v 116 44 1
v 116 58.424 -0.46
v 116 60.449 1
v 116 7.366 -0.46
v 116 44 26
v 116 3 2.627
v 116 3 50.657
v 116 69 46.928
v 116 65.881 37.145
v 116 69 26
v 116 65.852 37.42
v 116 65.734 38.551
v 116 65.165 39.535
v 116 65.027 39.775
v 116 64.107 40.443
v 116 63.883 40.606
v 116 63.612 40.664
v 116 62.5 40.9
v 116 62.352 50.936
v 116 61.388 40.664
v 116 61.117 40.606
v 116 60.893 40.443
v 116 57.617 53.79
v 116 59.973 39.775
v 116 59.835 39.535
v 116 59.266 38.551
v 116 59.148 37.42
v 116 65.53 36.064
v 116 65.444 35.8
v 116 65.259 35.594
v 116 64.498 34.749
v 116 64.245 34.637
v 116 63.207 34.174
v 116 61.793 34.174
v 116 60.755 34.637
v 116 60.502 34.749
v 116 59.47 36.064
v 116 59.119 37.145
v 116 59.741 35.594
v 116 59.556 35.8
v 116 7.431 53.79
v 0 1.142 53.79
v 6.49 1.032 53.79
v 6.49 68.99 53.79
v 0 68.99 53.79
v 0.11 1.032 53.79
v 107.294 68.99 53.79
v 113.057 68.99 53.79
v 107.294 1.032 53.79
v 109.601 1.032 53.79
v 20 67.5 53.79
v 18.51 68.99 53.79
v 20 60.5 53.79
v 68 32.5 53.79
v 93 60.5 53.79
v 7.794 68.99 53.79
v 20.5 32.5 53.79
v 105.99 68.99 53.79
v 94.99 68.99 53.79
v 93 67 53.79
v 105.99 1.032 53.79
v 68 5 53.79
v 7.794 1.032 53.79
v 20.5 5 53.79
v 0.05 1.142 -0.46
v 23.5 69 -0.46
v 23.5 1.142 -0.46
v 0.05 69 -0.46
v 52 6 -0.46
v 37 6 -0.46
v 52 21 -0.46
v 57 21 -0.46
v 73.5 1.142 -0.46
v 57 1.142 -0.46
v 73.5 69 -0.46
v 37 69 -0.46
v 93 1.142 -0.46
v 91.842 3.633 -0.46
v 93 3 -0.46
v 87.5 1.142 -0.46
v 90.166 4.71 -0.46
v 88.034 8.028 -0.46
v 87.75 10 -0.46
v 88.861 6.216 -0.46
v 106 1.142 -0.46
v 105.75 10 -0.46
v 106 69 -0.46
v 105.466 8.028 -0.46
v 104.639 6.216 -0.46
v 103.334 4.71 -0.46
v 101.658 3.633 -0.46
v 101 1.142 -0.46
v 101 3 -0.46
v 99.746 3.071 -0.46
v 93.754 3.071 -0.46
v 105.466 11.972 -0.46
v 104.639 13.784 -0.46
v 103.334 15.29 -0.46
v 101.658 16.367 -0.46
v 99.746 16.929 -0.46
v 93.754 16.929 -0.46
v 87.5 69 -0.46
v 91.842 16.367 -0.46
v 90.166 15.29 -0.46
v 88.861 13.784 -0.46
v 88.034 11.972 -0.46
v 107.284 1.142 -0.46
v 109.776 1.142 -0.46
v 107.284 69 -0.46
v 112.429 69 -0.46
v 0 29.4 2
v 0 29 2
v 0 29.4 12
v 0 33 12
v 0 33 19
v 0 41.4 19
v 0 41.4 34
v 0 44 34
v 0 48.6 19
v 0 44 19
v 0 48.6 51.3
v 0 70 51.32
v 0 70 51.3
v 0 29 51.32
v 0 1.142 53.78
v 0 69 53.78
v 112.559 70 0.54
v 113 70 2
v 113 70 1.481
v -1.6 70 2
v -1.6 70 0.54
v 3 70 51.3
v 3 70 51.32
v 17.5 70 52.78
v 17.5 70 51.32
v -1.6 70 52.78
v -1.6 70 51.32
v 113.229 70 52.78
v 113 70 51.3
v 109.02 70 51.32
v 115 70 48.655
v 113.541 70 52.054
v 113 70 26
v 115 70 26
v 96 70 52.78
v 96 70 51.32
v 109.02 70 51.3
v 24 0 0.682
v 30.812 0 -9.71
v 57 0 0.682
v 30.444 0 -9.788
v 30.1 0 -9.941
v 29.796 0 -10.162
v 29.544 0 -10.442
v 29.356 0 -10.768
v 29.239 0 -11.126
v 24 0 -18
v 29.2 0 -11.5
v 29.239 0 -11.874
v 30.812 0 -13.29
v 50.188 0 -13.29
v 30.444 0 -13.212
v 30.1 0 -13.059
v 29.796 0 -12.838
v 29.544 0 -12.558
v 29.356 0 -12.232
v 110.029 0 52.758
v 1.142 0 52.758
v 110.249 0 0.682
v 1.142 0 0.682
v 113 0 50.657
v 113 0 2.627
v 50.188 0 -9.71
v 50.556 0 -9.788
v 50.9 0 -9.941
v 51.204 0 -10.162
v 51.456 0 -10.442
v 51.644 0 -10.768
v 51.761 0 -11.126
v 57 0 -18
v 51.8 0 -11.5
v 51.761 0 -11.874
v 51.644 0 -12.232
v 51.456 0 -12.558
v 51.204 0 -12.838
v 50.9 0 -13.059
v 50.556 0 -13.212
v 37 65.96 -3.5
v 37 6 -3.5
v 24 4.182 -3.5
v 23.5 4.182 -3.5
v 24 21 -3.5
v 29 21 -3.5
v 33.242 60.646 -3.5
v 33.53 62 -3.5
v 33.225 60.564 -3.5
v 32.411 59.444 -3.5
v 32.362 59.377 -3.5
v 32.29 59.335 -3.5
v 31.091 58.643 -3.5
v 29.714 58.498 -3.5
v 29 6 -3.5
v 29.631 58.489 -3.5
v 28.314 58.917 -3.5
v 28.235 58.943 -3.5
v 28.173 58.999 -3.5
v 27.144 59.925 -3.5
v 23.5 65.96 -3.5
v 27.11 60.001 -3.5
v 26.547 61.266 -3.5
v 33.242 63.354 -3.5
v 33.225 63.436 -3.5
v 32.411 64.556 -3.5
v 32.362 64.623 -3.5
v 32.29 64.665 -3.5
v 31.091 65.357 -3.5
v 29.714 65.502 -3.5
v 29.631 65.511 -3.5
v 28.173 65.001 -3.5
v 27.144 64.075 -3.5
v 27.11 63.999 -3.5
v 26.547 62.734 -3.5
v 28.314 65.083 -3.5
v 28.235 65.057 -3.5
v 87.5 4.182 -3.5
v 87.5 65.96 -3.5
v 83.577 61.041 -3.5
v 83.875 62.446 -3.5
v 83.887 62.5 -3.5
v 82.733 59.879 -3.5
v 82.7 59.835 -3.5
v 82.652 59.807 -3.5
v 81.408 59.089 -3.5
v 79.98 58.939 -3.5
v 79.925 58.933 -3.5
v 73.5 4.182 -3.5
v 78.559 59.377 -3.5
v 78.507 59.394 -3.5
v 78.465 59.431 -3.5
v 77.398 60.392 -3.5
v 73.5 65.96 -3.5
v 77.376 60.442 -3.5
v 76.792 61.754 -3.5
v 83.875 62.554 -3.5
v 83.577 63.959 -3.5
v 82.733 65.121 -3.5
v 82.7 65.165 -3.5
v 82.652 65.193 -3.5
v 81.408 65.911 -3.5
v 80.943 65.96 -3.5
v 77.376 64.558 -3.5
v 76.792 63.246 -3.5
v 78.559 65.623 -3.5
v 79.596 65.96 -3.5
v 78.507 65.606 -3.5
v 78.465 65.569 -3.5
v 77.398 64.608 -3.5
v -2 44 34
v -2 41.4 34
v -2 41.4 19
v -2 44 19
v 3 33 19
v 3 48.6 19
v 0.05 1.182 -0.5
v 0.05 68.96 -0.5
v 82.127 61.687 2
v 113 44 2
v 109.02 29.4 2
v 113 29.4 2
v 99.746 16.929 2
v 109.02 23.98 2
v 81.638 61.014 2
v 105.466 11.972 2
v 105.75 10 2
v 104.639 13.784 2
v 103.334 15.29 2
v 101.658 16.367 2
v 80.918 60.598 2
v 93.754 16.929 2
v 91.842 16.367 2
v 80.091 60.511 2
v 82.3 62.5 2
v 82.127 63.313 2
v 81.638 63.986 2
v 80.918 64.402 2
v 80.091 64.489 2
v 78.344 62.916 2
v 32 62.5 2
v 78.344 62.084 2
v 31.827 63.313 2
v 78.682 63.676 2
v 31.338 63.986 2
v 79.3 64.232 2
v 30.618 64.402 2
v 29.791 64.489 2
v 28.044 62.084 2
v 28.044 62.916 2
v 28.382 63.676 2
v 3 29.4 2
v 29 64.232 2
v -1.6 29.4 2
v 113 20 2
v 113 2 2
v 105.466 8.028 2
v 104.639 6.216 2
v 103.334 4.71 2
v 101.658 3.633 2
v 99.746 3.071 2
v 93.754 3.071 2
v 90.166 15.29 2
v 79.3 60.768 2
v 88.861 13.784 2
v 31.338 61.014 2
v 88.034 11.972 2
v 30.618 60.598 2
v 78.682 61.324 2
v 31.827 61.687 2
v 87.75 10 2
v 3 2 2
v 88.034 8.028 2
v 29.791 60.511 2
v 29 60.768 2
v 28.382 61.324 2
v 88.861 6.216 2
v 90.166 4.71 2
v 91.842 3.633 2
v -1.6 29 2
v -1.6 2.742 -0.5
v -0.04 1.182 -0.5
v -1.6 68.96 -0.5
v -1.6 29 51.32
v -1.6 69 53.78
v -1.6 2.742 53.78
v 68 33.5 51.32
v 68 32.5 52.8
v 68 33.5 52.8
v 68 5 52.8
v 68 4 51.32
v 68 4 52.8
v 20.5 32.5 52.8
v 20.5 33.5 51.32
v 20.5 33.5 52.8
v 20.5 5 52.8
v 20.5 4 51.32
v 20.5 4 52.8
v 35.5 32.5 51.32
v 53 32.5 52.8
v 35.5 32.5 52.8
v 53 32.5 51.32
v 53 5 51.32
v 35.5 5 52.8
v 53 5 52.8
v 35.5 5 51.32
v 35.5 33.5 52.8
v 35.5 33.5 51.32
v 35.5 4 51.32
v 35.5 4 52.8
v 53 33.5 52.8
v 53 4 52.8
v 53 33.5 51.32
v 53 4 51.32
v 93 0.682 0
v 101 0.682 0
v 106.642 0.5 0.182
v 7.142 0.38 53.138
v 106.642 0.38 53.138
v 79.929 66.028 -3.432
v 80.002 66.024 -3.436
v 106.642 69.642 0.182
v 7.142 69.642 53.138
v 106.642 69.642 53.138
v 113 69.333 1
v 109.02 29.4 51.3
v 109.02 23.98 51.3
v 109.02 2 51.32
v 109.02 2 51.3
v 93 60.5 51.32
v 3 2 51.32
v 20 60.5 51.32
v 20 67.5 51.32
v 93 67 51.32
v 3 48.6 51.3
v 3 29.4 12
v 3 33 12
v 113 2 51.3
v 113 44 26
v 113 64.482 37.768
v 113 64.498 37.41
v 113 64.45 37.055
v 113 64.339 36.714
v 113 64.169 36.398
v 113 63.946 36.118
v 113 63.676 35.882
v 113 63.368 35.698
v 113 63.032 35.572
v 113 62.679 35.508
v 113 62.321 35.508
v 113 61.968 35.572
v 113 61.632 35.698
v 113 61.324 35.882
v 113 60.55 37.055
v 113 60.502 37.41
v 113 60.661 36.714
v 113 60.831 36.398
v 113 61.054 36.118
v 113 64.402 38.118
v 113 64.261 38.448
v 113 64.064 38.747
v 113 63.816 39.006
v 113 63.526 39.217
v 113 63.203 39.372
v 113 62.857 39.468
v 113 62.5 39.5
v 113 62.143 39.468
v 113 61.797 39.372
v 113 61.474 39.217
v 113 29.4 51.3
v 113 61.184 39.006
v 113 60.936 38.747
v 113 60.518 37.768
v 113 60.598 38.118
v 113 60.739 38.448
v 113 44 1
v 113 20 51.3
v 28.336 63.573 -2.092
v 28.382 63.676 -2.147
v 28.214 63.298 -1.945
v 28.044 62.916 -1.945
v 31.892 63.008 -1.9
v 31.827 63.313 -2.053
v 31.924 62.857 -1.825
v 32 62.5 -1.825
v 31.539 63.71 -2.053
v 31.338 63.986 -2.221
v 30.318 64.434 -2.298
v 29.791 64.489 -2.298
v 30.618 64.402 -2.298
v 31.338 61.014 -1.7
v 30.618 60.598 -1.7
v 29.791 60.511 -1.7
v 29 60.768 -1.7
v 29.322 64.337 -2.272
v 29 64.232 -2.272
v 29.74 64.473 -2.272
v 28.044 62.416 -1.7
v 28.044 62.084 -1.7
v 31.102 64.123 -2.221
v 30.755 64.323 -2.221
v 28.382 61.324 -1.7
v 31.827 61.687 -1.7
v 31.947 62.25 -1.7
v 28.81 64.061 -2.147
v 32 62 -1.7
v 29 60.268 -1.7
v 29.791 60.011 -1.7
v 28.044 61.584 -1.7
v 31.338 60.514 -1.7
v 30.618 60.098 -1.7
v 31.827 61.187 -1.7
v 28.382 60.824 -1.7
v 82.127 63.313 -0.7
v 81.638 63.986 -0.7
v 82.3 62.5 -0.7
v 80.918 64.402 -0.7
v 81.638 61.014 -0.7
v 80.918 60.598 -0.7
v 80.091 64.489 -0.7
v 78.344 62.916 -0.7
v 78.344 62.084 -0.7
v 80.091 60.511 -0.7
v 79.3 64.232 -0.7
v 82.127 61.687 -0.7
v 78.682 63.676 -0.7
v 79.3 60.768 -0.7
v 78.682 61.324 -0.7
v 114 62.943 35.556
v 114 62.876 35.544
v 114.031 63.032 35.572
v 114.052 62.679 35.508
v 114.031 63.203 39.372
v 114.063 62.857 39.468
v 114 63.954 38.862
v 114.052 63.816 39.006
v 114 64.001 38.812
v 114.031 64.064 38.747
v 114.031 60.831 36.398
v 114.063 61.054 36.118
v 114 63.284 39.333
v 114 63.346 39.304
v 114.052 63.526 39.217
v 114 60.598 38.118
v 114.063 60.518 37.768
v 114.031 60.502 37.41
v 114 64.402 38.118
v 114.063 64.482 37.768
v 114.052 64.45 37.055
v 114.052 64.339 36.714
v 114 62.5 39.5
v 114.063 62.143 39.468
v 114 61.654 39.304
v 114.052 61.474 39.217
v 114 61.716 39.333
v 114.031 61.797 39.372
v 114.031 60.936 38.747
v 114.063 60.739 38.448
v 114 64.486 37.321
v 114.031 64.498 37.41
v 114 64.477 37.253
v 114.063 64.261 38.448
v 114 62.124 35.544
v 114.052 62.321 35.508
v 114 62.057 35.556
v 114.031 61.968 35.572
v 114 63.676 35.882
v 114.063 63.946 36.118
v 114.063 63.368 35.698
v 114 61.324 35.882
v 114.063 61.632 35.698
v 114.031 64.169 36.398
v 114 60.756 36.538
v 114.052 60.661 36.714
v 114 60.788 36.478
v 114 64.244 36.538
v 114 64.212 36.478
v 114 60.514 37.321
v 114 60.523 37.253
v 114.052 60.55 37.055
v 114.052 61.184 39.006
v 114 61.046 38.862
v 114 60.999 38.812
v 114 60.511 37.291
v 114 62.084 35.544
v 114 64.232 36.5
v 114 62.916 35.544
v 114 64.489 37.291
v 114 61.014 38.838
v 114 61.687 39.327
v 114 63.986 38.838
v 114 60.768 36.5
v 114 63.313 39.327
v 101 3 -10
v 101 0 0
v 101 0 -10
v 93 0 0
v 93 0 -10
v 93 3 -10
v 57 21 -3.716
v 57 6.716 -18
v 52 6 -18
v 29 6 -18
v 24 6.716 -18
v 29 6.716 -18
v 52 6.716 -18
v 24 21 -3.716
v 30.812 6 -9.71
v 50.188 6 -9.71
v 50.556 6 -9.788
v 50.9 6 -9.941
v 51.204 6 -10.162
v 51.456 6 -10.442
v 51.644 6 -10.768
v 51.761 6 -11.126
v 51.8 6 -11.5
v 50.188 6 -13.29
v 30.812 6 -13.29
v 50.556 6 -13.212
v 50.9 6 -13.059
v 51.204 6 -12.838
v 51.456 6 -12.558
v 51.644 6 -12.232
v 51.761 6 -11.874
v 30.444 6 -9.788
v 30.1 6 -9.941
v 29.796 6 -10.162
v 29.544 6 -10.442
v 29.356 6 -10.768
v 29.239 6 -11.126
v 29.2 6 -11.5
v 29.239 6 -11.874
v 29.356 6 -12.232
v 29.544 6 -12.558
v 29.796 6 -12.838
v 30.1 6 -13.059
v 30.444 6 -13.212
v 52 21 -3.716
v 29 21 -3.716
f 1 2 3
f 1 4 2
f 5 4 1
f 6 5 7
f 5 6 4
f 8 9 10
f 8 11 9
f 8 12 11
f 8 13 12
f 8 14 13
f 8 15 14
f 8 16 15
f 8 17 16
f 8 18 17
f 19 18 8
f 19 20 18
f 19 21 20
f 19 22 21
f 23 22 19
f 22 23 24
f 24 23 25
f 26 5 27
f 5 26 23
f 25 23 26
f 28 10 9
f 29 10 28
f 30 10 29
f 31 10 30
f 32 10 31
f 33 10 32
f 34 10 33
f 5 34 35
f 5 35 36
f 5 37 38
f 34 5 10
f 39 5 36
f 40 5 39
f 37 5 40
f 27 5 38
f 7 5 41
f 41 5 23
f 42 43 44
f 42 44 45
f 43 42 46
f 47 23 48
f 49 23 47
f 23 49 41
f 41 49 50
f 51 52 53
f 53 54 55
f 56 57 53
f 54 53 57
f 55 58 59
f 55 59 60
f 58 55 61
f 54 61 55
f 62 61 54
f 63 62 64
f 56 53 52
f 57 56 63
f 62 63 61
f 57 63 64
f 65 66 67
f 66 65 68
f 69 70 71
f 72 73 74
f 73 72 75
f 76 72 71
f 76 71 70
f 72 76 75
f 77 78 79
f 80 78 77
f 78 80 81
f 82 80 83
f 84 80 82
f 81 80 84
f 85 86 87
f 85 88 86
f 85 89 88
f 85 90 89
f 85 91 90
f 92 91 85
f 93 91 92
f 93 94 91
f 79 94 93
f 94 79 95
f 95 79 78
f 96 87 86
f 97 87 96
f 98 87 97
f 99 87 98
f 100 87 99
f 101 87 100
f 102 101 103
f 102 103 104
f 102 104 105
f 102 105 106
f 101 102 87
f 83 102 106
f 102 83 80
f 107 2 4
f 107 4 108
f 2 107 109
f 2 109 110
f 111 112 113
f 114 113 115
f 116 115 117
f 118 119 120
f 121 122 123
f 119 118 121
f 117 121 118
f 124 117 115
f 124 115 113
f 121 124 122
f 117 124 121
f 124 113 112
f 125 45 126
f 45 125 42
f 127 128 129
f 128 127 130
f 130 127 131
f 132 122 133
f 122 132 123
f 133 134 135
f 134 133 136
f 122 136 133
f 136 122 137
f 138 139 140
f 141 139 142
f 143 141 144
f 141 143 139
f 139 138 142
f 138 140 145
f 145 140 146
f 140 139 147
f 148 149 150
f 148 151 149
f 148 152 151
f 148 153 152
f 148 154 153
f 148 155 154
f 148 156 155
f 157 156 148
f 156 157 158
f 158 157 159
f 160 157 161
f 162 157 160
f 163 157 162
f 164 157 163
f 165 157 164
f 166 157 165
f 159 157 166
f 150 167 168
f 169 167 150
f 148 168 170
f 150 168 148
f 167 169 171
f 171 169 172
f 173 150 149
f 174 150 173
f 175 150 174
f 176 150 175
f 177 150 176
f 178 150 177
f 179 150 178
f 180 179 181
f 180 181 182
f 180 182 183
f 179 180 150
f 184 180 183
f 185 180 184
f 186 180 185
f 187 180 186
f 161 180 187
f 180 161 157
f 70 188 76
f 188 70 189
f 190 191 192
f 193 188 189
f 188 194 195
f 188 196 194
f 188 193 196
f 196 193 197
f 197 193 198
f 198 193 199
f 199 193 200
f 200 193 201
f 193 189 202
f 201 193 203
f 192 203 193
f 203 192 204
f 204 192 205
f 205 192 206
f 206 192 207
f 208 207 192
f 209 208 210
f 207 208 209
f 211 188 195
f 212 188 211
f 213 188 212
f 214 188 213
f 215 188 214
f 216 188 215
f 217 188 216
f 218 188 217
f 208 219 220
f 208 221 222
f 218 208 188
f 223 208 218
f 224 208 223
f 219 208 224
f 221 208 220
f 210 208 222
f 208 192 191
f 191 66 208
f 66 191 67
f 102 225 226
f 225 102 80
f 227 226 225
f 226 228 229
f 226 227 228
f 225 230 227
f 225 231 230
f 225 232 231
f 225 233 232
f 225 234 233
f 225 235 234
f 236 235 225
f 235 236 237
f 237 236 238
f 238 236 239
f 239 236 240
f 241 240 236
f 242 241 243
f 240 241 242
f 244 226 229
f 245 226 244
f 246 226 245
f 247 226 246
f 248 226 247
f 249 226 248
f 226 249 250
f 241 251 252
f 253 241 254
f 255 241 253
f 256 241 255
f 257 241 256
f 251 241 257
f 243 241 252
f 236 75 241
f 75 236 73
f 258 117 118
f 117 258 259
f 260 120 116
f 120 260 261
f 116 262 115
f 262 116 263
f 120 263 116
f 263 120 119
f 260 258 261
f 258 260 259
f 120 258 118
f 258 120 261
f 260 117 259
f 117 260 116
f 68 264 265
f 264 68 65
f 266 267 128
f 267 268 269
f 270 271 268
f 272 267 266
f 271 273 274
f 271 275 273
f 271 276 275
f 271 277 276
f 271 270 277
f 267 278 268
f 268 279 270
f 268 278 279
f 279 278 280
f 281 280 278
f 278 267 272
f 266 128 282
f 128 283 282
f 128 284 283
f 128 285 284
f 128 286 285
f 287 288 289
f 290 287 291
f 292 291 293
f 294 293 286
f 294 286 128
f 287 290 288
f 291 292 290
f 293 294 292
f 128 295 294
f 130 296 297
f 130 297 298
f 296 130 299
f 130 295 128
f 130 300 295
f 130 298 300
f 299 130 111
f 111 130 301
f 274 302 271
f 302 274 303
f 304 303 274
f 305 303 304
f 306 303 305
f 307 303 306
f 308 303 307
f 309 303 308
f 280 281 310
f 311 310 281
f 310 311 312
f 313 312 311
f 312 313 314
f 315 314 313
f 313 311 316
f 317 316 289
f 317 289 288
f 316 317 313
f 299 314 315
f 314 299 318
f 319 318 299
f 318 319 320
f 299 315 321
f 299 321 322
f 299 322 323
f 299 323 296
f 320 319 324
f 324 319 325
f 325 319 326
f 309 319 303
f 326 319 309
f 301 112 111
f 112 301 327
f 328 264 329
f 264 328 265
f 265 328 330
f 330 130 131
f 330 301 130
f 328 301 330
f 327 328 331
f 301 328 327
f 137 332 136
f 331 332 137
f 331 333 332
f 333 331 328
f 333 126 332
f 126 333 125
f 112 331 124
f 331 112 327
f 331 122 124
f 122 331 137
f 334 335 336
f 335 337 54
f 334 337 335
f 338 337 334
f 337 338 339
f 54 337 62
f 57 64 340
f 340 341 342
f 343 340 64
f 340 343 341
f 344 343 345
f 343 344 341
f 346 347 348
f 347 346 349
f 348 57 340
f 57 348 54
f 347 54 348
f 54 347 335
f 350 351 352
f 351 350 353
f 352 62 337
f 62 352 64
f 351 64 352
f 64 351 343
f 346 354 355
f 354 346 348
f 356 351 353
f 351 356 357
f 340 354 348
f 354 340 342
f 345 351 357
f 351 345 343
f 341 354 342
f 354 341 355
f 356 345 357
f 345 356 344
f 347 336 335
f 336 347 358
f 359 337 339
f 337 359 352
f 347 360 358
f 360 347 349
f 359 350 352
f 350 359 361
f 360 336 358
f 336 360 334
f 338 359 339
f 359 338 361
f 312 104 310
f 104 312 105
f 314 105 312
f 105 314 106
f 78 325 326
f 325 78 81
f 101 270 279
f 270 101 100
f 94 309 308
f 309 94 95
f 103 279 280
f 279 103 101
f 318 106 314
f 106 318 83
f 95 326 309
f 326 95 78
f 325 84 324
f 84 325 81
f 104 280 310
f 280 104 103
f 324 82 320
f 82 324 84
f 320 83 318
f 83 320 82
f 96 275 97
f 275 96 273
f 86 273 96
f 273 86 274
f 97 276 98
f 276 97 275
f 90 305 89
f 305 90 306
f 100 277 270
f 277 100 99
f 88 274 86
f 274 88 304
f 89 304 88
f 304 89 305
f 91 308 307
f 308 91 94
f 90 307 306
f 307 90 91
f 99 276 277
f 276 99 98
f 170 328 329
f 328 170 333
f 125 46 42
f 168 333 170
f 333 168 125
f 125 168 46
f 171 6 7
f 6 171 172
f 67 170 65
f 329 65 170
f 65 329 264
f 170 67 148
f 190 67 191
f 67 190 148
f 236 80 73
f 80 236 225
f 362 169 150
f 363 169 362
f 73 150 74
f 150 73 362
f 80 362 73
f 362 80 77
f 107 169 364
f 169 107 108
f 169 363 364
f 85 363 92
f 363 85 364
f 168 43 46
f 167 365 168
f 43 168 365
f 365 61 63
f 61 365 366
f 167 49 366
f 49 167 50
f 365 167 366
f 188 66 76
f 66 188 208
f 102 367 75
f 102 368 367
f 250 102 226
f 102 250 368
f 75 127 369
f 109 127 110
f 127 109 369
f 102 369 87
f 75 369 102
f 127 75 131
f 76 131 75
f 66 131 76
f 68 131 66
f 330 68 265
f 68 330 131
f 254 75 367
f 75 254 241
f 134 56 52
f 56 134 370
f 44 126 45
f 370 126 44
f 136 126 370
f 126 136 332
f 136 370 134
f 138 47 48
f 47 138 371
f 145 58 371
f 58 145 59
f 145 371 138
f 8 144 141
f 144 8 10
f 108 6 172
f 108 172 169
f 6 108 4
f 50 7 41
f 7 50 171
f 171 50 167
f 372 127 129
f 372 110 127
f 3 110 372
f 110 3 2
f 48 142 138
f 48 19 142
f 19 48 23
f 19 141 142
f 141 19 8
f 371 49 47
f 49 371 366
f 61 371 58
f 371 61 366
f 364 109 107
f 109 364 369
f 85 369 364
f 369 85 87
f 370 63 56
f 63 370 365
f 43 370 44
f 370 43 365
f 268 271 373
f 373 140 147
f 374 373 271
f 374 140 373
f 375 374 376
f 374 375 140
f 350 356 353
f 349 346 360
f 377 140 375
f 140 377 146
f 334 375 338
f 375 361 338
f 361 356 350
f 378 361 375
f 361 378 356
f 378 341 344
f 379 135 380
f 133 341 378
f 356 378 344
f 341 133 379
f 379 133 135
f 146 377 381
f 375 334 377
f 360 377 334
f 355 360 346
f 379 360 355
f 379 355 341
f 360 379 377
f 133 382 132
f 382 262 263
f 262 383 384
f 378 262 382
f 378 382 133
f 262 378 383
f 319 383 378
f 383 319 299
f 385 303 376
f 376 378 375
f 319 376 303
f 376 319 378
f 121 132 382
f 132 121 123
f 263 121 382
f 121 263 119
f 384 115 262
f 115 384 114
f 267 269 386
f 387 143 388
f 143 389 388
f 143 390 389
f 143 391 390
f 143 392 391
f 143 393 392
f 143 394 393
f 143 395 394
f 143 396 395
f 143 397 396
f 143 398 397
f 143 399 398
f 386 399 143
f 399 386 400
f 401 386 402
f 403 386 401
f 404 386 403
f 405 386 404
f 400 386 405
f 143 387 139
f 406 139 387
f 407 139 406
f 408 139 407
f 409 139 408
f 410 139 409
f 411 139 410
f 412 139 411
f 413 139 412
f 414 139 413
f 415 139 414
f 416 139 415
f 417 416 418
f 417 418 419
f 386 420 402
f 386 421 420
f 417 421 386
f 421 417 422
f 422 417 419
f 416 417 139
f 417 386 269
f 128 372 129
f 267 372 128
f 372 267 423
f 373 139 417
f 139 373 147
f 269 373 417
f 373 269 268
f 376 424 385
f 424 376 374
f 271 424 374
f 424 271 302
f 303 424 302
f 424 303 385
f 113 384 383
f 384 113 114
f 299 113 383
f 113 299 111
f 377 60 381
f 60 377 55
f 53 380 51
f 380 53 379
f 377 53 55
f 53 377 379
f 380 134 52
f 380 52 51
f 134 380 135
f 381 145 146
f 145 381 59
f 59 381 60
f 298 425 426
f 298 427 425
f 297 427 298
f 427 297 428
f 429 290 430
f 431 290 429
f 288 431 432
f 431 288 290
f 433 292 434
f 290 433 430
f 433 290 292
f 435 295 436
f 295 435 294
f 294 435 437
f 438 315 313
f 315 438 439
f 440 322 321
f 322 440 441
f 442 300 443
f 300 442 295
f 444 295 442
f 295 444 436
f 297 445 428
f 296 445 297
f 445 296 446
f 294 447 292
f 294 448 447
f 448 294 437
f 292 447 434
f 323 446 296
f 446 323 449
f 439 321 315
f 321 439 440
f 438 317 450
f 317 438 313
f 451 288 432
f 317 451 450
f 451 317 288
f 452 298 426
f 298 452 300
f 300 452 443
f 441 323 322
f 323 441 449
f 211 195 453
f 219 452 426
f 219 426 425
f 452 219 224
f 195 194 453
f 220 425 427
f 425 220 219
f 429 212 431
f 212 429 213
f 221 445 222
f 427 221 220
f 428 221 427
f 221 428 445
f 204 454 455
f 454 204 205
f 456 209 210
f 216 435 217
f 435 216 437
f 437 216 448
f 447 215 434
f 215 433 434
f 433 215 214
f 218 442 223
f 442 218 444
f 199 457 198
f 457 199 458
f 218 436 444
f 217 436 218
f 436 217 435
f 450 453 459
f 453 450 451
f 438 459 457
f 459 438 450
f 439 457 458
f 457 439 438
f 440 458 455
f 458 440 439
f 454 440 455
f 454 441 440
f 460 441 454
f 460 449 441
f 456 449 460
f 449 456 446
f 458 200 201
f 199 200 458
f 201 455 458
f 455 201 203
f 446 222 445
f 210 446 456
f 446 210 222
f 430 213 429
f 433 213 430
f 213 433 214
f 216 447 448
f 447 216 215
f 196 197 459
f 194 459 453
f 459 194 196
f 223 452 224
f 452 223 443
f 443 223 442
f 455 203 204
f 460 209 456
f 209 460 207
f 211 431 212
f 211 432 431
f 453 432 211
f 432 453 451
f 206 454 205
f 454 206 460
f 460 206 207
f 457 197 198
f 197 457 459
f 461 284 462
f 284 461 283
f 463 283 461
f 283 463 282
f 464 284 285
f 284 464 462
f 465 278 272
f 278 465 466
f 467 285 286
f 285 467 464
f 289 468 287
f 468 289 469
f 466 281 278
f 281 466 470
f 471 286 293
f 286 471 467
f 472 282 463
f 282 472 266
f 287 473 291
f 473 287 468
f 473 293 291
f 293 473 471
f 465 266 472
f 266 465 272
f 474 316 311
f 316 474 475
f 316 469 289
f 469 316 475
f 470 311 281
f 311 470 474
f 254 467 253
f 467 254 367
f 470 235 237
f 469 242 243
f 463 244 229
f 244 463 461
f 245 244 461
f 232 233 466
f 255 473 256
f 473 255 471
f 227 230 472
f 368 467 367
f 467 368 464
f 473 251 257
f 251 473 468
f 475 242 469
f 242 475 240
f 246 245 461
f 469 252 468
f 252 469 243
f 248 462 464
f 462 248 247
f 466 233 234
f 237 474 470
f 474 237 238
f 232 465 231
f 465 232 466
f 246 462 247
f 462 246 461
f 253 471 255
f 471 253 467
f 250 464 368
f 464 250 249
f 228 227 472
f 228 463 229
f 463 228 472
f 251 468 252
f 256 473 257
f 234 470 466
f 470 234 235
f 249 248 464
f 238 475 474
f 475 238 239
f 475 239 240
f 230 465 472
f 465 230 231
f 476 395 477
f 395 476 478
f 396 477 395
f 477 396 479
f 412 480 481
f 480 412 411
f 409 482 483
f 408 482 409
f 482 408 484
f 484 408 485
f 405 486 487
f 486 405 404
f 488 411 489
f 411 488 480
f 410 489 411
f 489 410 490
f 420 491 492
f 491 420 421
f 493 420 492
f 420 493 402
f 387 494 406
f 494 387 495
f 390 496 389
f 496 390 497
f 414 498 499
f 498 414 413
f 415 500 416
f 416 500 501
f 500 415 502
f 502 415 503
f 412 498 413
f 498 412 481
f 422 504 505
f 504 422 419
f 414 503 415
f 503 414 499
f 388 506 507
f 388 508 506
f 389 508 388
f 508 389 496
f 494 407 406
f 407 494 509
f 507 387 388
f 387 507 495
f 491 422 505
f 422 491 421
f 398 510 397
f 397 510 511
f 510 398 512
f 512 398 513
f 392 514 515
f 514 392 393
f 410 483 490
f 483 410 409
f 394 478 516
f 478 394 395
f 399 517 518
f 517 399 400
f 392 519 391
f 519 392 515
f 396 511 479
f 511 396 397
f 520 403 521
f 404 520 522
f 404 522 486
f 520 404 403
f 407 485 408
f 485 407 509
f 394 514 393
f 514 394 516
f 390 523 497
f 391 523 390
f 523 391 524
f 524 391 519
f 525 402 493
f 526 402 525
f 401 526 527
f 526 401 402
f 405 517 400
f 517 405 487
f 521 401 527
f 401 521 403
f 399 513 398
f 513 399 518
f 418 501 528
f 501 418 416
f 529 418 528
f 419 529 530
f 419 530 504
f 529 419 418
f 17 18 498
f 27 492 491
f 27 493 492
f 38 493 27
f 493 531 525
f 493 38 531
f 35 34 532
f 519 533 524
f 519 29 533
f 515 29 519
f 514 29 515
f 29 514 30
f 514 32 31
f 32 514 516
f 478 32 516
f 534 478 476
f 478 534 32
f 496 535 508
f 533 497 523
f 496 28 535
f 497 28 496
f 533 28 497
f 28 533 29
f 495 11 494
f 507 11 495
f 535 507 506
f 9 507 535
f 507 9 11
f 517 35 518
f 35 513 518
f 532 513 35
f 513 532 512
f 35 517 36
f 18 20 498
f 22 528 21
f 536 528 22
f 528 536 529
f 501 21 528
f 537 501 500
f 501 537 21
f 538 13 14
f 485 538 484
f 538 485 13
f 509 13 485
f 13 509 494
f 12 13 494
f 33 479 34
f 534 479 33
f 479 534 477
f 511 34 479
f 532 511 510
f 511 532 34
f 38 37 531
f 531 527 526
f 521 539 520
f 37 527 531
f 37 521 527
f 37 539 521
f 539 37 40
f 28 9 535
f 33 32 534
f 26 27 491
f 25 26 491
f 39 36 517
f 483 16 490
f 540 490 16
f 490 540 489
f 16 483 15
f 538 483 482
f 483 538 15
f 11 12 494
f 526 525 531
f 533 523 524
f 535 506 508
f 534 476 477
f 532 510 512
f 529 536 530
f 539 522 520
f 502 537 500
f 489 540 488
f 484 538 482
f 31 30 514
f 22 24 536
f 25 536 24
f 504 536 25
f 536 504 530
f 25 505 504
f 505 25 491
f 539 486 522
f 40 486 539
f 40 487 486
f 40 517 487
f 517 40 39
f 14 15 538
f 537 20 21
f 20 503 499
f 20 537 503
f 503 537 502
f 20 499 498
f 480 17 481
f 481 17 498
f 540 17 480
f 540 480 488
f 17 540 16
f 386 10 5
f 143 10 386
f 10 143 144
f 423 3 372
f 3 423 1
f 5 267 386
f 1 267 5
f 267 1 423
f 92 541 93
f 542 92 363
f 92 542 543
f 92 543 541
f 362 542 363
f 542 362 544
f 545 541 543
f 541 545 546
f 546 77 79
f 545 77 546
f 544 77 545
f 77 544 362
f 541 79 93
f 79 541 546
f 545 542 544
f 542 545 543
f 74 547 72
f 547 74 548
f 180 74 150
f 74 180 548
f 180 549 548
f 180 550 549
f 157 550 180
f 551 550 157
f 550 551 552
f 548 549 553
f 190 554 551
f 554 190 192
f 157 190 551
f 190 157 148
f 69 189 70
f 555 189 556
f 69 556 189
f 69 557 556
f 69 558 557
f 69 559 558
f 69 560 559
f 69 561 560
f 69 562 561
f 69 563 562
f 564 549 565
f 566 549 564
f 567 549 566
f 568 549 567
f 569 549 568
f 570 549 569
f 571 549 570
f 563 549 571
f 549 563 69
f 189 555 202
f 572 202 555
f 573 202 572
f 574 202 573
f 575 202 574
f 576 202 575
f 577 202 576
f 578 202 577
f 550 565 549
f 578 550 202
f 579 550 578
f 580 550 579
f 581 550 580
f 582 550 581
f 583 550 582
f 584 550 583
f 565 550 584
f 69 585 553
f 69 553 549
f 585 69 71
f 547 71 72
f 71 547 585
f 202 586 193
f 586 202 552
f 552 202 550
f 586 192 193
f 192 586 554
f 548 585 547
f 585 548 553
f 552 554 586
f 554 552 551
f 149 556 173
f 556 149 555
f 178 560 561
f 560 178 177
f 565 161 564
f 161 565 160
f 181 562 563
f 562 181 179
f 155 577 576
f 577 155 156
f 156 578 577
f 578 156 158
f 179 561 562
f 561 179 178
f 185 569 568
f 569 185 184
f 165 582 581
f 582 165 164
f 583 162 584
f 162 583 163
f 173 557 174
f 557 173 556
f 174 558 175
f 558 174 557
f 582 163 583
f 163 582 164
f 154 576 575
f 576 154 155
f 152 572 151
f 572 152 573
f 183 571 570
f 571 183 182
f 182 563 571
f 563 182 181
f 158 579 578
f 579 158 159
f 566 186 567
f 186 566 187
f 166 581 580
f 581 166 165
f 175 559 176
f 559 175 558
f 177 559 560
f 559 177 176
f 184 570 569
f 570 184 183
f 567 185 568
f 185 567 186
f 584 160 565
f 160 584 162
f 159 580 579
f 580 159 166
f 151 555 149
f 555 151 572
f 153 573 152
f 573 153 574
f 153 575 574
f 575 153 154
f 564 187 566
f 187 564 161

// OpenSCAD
// PRUSA iteration3
// PSU Cover
// GNU GPL v3
// Josef Průša <iam@josefprusa.cz> and contributors
// http://www.reprap.org/wiki/Prusa_Mendel
// http://prusamendel.org



module CubeAdjust(Xdim, Zdim){
    for (x =[6:12.2:Xdim-12]){
        for (z =[4.5:12:Zdim-12]){
        
        translate([x,-0.2,z])cube([10.3,0.4,10]);
        }
        }
}

module PSU_COVER()
{
difference(){
    union(){
    
        translate([0,0,-0.46])cube([116,50+15+5,54.25]); // Base
        translate([23.5,0,-3.5])cube([14-0.5,50+15+5,5]); // Back pillar 1
        translate([66-0.5+8,0,-3.5])cube([14,50+15+5,5]); // Back pillar 2
        translate([91+4,0,-0.46])cube([6,50+15,54.25]); // Base for bracket
        translate([-2,45.4-4,19])cube([2,2.6,15]); // nipple on the right
        translate([-1.6,0,-0.5])cube([1.65,70,2.5]); // Frame skirt 1
        translate([-1.6,0,0])cube([1.65,29,53.78]); // Frame skirt 2
        translate([-1.6,0,51.32])cube([1.65,70,2.46]); // Frame skirt 3
        

}

//pretty corners
translate([-11,-2,-3.6])rotate([0,0,-45])cube([10,10,59]); // right bottom
translate([95+21-5,-2,-2])rotate([0,0,-45])cube([10,10,58]); // left botton
translate([-3,-9,-4.46])rotate([-45,0,0])cube([130,10,10]); // back bottom

translate([-3,-12,54.9])rotate([-45,0,0])cube([130,10,10]); // bottom front edge
translate([-3,45+15+5,-4.46])rotate([-45,0,0])cube([130,10,10]); // bottom edge
translate([-3,48+15+5,54.78])rotate([-45,0,0])cube([130,10,10]); // top front edge

translate([113-3,70+5,-2])rotate([0,0,-45])cube([10,10,58]); // top left edge

translate([111,0-10,-20])rotate([0,-45,-45])cube([20,20,20]); // back left bottom corner
translate([111,0-10,45])rotate([0,-45,-45])cube([20,20,20]); // front left bottom corner
translate([111,60,-10])rotate([-35,-45,-45])cube([20,20,20]); // back left top corner
translate([111,60,64])rotate([-55,48,-48])cube([20,20,20]); // front left top corner

translate([79+13.5,-5,67.28])rotate([0,45,0])cube([20,90,20]); // front left line
translate([79+13.5,-5,-13.96])rotate([0,45,0])cube([20,90,20]); // back left line
translate([-7,-5,67.28])rotate([0,45,0])cube([20,90,20]); // froNt right line

translate([3,2,2])cube([106.02,50.02+15+5,50.02-0.7]); // main cutout
translate([-3,50-16.4+15,2])cube([100,16.5+5,50-0.7]); // insert cutout
translate([-3,50-16.4-15.6+15,2])cube([10,100,17]); // right bottom cutout

translate([101+2,50-16.4-17.6+15+0.9-2.5,2])cube([10,100,50-0.7]); // shelf top cutout
translate([101+2,10,2])rotate([0,0,45]) cube([10*sqrt(2),10*sqrt(2),50-0.7]); // shelf angle cutout
translate([101+2,2,2]) cube([10,18,50-0.7]); // shelf bottom cutout

translate([-3,50-16.4-17.6+15+0.9-2.5,2])cube([100,100,10]); //  bottom cutout

translate([20,60.5,50])cube([73,10,10]); // Vent cutout
translate([20,67.5,50])rotate(45,0,0)cube([10,10,10]);
translate([93,67,50])rotate(45,0,0)cube([10,10,10]);

SOCKET_OFFSET = 25;

translate([5.5,0,0]){
    translate([40 - SOCKET_OFFSET,5,50])cube([47.5,27.5,10]); // socket cutout
    translate([40 - SOCKET_OFFSET,4,50])cube([15,29.5,2.8]);
    translate([72.5 - SOCKET_OFFSET,4,50])cube([15,29.5,2.8]);
}

translate([7-0.5-0.5+18+6,43.5-1+15+0.5+4.5,-10])cylinder(r=2,h=50,$fn=15); //  right back mounthole cutout
translate([7-0.5-0.5+18+6,43.5-1+15+0.+4.5,-3.7])cylinder(r2=2, r1=3.7,h=2,$fn=15);

translate([67.5-0.7-0.5+8+6,43.5-1+15+0.5+4.5,-10])cylinder(r=2,h=50,$fn=15); //  left back mounthole cutout
translate([67.5-0.7-0.5+8+6,43.5-1+15+0.5+4.5,-3.7])cylinder(r2=2, r1=3.7,h=3,$fn=15);


translate([130+16,32+26+4.5,55-4-25+11.5])rotate([0,-90,0])cylinder(r=2,h=50,$fn=35); // Left side bracket screw hole L
translate([117,32+26+4.5,55-4-25+11.5])rotate([0,-90,0])cylinder(r2=2, r1=4.1,h=3,$fn=15);

//Old version
//translate([130+16,32+26+4.5,55-4-25-11.5])rotate([0,-90,0])cylinder(r=2,h=50,$fn=35); // Left side bracket screw hole R
//translate([117,32+26+4.5,55-4-25-11.5])rotate([0,-90,0])cylinder(r2=2, r1=4.1,h=3,$fn=15);
//Gap for power adapter
        translate([113,44,1])cube([5, 26, 25]);

        //cylinder(r=20,h=50,$fn=35); 




//translate([-2,0,-1])CubeAdjust(116,54.25); // bottom squares cutout

    for(i=[0:4]){
        translate([94.75+i,10,-10])cylinder(r=7,h=50); //back power wire cutout
        }
    }
}

module bottom_reinf(placement_diff, x_mount_offset, x_reinf_offset){
    union(){
        // Distance from the corner
        translate([ 93, 0, -10 ]) cube([ 8, 3, 10 ]);  //Wiring ledge
        translate([59.5 - placement_diff - x_mount_offset, 0, -18 ])
            cube([ 33, 6, 19 ]);  // reinforcement plate
        //translate([19.5, 0, -18 ]) cube([ 33, 6, 19 ]);  // reinforcement plate
        translate([ 73.5 - placement_diff, 5, -18 ]) cube([ 5, 16, 19 ]);  // vertical_reinforcement right
        translate([ 73.5 - placement_diff - x_reinf_offset, 5, -18 ])
            cube([ 5, 16, 19 ]);  // vertical_reinforcement left
    }

}


module PSU_Y_REINFORCEMENT()
{
    
    PLACEMENT_DIFF = 21.5;
    Z_DIFF = 1;
    X_MOUNT_OFFSET = 14;
    REINF_OFFSET = 28;
    
    
  
difference()
{
   // base shape
    bottom_reinf(PLACEMENT_DIFF, X_MOUNT_OFFSET, REINF_OFFSET);
    union (){// cutouts
            // corner cuts
            // angled vertical support
            translate([ 68.5 - PLACEMENT_DIFF, 20, -34 + Z_DIFF ])
                rotate([ 45, 0, 0 ])
                    cube([ 15, 23, 20 ]);//vertical reinf cutout right
            translate([ 68.5 - PLACEMENT_DIFF - REINF_OFFSET, 20, -34 + Z_DIFF ])
                rotate([ 45, 0, 0 ])
                    cube([ 15, 23, 20 ]); //vertical reinf cutout left
            mount_hole_angle = 90;
            hull(){
                translate([71.5 - PLACEMENT_DIFF, 8, -11.5 ])
                    rotate([mount_hole_angle, 0, 0 ])
                        cylinder( h = 10, r = 1.8, $fn=30 );  //hole B
                translate([52.5 - PLACEMENT_DIFF, 8, -11.5 ])
                    rotate([mount_hole_angle, 0, 0 ])
                        cylinder( h = 10, r = 1.8, $fn=30 );  //hole B
                
            }
        }
}
}


module FINAL_PART(){
    union()
        {
            PSU_COVER();
            PSU_Y_REINFORCEMENT();
        }   
}

FINAL_PART();
